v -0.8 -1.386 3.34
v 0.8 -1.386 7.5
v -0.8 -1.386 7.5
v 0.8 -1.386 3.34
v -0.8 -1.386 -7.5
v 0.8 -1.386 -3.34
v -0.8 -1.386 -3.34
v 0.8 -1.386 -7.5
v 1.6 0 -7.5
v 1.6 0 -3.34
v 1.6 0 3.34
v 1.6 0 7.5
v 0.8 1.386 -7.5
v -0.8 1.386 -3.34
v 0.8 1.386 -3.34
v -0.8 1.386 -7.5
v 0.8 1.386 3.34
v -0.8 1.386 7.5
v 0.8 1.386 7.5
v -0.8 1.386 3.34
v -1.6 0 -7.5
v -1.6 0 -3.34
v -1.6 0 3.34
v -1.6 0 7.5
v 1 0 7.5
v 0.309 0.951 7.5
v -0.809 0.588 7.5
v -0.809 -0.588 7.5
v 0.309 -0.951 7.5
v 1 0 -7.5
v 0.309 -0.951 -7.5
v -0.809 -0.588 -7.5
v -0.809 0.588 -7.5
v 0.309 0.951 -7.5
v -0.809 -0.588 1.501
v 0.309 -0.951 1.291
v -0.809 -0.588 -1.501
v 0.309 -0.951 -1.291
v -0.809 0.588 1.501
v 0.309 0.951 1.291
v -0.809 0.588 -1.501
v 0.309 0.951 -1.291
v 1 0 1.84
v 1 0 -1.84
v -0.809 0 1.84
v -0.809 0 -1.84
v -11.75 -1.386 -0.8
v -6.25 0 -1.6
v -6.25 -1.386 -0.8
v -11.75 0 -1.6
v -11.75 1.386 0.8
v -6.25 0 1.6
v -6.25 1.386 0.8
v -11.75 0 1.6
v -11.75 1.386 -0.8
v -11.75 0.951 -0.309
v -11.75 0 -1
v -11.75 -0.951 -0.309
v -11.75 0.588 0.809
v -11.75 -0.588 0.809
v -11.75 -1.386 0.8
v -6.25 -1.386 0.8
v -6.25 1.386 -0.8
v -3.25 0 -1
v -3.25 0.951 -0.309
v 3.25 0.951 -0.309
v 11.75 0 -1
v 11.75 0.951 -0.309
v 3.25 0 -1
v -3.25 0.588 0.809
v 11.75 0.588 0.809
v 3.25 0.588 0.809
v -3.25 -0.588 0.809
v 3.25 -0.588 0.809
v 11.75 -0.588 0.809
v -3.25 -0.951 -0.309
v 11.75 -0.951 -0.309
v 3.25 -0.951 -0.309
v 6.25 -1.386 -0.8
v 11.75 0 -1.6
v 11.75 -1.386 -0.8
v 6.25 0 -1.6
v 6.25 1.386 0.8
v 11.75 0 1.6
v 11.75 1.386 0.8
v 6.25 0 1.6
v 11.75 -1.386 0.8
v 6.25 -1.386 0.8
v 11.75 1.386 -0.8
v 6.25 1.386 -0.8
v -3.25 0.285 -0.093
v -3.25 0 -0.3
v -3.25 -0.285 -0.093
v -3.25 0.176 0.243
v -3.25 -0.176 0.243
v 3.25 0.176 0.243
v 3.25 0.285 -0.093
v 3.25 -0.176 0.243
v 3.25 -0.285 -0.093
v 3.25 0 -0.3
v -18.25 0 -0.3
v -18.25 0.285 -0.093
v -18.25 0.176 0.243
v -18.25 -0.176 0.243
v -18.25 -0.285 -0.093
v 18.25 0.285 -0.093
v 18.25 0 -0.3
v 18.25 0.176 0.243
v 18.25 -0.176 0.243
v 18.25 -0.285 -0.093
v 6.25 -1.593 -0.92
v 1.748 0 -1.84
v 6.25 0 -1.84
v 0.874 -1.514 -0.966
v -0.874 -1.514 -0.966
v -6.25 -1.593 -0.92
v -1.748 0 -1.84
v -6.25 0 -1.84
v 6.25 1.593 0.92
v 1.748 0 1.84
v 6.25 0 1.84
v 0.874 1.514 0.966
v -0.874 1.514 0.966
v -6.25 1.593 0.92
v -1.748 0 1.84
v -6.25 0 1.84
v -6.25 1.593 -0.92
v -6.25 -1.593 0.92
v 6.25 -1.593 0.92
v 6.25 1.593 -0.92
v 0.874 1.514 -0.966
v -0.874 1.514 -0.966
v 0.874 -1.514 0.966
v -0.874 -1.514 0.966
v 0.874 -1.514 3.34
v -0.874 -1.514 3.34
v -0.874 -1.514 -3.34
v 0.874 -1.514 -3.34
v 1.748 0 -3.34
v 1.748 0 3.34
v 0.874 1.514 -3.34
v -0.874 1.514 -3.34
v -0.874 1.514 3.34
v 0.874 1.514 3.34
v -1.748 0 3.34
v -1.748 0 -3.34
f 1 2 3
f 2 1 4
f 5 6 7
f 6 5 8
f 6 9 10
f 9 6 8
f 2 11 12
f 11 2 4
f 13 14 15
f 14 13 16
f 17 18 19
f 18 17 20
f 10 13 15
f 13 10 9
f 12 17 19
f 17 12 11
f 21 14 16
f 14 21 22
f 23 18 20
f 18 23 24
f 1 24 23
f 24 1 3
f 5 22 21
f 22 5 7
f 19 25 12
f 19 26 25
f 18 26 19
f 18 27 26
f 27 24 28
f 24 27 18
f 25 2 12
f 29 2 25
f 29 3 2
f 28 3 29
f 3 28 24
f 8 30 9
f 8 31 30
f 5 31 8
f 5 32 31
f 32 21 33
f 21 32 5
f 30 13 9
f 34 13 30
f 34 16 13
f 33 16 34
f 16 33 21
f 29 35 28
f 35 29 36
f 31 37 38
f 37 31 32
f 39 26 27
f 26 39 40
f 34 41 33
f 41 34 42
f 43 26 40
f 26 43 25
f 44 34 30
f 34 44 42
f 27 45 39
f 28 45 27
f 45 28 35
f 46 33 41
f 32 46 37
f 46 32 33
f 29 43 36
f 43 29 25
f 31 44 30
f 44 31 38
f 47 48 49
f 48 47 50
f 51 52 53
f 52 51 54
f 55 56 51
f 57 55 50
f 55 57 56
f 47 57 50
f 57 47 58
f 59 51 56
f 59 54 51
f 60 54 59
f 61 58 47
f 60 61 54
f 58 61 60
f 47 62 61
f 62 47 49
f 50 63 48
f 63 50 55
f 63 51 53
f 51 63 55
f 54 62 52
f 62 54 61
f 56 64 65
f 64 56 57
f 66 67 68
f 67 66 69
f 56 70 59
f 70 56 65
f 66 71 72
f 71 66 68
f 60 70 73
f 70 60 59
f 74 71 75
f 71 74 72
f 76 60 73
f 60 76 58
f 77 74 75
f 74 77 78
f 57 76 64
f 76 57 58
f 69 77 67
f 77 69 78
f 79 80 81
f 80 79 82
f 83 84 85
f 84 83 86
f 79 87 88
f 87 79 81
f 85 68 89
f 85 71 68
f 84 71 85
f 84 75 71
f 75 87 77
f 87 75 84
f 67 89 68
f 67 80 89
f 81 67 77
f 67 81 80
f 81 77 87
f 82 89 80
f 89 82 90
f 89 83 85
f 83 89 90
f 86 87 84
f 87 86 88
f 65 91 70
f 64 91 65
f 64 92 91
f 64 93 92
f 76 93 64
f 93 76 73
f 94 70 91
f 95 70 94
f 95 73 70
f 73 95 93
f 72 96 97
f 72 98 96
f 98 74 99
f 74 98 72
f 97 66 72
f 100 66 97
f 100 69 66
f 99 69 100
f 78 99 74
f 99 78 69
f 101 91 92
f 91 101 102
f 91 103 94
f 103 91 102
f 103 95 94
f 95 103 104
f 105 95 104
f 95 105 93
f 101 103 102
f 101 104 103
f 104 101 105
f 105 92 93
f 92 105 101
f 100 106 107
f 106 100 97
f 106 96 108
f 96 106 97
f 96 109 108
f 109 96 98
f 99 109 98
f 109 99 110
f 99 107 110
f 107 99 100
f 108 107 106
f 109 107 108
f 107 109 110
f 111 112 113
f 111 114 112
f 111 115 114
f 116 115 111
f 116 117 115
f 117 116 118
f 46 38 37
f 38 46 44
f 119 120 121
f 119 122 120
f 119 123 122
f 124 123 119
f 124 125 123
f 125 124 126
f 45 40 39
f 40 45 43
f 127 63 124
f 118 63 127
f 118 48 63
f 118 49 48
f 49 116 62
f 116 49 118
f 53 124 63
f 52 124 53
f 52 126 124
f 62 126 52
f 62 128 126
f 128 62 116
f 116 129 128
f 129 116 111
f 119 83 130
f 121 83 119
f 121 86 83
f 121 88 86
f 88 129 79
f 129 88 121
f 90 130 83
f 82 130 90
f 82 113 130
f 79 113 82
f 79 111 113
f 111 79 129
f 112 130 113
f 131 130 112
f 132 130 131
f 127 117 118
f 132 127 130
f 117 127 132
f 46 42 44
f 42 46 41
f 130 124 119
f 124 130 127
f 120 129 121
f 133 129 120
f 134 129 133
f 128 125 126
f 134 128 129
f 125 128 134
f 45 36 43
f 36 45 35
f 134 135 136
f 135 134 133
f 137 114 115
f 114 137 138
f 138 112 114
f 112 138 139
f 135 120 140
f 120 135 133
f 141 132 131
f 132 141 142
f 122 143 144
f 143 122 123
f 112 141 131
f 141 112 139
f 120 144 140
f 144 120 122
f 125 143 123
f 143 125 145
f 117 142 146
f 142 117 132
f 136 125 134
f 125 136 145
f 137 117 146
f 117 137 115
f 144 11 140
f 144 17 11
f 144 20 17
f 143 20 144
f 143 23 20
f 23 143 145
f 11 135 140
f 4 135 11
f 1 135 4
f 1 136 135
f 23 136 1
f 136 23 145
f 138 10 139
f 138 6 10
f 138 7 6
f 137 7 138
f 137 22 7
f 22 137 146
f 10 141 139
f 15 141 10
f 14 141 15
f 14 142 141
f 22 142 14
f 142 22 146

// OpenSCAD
// Parameters
length = 15; //[8:30:1]
forced_id = 0; //[0:10:1]
center = true; //[0:1:1]
type_id = 0; //[0:5:1]
default_id = 2.0; //[1.0:4.0:0.1]
default_od = 3.2; //[1.6:6.4:0.1]
wall_extra = 0.0; //[-0.5:1.0:0.1]
overlap = 1.0; //[0.5:2.0:0.1]
resistor_body_length = 6.5; //[4.0:13.0:0.1]
resistor_body_diameter = 2.5; //[1.5:5.0:0.1]
lead_diameter = 0.6; //[0.3:1.2:0.05]
bare_lead = 5; //[2:10:1]
sleeving_length = 10; //[5:25:1]

// Derived
id_r = ((forced_id > 0) ? forced_id : default_id) / 2;
od_r = (default_od + wall_extra) / 2;
eps = 0.01;

// 1–2mm overlap to guarantee connection
conn = 1.5;

// Tubing - complete geometry
module tubing() {
  color([0.85, 0.85, 0.8]) {
    difference() {
      cylinder(h=length, r=od_r, center=center);
      cylinder(h=length + 2*eps, r=id_r, center=center);
    }
  }
}

// Sleeved Resistor - complete geometry (with connected center collar)
module sleeved_resistor() {

  // Precompute positions so all parts overlap by conn
  body_half = resistor_body_length/2;
  sleeve_half = sleeving_length/2;

  // Sleeve centers along X so inner ends overlap into body by conn
  // Inner end of left sleeve: x = -body_half + conn
  // Inner end of right sleeve: x =  body_half - conn
  left_sleeve_x  = -(body_half + sleeve_half - conn);
  right_sleeve_x =  (body_half + sleeve_half - conn);

  // Leads (extend through sleeves and into body slightly)
  lead_len = sleeving_length + bare_lead + conn;
  left_lead_x  = -(body_half + lead_len/2 - conn);
  right_lead_x =  (body_half + lead_len/2 - conn);

  // Center collar MUST be physically attached to the black sleeves:
  // Make it span from (left sleeve inner end - conn) to (right sleeve inner end + conn)
  // so it overlaps each sleeve by conn.
  collar_len = resistor_body_length + 4*conn; // guarantees overlap into both sleeves
  collar_r_outer = od_r * 1.15;
  collar_r_inner = id_r;

  // Vertical insert/sleeve through the center (the "floating" light gray piece in views)
  // Attach it by intersecting the collar and the resistor body region.
  // Make it pass through the collar with 1–2mm overlap.
  insert_h = (2*collar_r_outer) + 2*conn; // tall enough to fully pass through collar
  insert_r_outer = collar_r_outer * 0.95;
  insert_r_inner = collar_r_inner;

  union() {
    // Black parts
    color([0.2, 0.2, 0.2]) union() {
      // Resistor body
      rotate([0, 90, 0])
        cylinder(h=resistor_body_length, r=resistor_body_diameter / 2, center=true);

      // Leads
      translate([left_lead_x, 0, 0])
        rotate([0, 90, 0]) cylinder(h=lead_len, r=lead_diameter / 2, center=true);

      translate([right_lead_x, 0, 0])
        rotate([0, 90, 0]) cylinder(h=lead_len, r=lead_diameter / 2, center=true);

      // Left lead sleeve (overlaps into body by conn)
      difference() {
        translate([left_sleeve_x, 0, 0])
          rotate([0, 90, 0]) cylinder(h=sleeving_length, r=od_r, center=true);
        translate([left_sleeve_x, 0, 0])
          rotate([0, 90, 0]) cylinder(h=sleeving_length + 2*eps, r=id_r, center=true);
      }

      // Right lead sleeve (overlaps into body by conn)
      difference() {
        translate([right_sleeve_x, 0, 0])
          rotate([0, 90, 0]) cylinder(h=sleeving_length, r=od_r, center=true);
        translate([right_sleeve_x, 0, 0])
          rotate([0, 90, 0]) cylinder(h=sleeving_length + 2*eps, r=id_r, center=true);
      }
    }

    // Light gray collar + vertical insert are UNIONED and OVERLAP the black sleeves/body
    color([0.75, 0.75, 0.7]) union() {
      // Center collar (horizontal, along X) - overlaps both black sleeves by conn
      difference() {
        rotate([0, 90, 0])
          cylinder(h=collar_len, r=collar_r_outer, center=true);
        rotate([0, 90, 0])
          cylinder(h=collar_len + 2*eps, r=collar_r_inner, center=true);
      }

      // Vertical sleeve/insert through center - physically attached by intersecting collar
      // (and also intersects the resistor body region at the center)
      difference() {
        cylinder(h=insert_h, r=insert_r_outer, center=true);
        cylinder(h=insert_h + 2*eps, r=insert_r_inner, center=true);
      }
    }
  }
}

// Assembly - single connected solid
module assembly() {
  // Ensure everything is one connected solid:
  // Place the standalone tubing so it intersects the resistor assembly by conn.
  // Both are centered at origin; align along Z (tubing) and ensure it intersects the collar/insert.
  union() {
    // Move tubing so it passes through the center region and intersects the vertical insert/collar.
    // With center=true, tubing spans [-length/2, +length/2] in Z already, so no translate needed.
    tubing();

    // Resistor assembly centered at origin; collar/insert at origin ensures intersection with tubing.
    sleeved_resistor();
  }
}

assembly();
